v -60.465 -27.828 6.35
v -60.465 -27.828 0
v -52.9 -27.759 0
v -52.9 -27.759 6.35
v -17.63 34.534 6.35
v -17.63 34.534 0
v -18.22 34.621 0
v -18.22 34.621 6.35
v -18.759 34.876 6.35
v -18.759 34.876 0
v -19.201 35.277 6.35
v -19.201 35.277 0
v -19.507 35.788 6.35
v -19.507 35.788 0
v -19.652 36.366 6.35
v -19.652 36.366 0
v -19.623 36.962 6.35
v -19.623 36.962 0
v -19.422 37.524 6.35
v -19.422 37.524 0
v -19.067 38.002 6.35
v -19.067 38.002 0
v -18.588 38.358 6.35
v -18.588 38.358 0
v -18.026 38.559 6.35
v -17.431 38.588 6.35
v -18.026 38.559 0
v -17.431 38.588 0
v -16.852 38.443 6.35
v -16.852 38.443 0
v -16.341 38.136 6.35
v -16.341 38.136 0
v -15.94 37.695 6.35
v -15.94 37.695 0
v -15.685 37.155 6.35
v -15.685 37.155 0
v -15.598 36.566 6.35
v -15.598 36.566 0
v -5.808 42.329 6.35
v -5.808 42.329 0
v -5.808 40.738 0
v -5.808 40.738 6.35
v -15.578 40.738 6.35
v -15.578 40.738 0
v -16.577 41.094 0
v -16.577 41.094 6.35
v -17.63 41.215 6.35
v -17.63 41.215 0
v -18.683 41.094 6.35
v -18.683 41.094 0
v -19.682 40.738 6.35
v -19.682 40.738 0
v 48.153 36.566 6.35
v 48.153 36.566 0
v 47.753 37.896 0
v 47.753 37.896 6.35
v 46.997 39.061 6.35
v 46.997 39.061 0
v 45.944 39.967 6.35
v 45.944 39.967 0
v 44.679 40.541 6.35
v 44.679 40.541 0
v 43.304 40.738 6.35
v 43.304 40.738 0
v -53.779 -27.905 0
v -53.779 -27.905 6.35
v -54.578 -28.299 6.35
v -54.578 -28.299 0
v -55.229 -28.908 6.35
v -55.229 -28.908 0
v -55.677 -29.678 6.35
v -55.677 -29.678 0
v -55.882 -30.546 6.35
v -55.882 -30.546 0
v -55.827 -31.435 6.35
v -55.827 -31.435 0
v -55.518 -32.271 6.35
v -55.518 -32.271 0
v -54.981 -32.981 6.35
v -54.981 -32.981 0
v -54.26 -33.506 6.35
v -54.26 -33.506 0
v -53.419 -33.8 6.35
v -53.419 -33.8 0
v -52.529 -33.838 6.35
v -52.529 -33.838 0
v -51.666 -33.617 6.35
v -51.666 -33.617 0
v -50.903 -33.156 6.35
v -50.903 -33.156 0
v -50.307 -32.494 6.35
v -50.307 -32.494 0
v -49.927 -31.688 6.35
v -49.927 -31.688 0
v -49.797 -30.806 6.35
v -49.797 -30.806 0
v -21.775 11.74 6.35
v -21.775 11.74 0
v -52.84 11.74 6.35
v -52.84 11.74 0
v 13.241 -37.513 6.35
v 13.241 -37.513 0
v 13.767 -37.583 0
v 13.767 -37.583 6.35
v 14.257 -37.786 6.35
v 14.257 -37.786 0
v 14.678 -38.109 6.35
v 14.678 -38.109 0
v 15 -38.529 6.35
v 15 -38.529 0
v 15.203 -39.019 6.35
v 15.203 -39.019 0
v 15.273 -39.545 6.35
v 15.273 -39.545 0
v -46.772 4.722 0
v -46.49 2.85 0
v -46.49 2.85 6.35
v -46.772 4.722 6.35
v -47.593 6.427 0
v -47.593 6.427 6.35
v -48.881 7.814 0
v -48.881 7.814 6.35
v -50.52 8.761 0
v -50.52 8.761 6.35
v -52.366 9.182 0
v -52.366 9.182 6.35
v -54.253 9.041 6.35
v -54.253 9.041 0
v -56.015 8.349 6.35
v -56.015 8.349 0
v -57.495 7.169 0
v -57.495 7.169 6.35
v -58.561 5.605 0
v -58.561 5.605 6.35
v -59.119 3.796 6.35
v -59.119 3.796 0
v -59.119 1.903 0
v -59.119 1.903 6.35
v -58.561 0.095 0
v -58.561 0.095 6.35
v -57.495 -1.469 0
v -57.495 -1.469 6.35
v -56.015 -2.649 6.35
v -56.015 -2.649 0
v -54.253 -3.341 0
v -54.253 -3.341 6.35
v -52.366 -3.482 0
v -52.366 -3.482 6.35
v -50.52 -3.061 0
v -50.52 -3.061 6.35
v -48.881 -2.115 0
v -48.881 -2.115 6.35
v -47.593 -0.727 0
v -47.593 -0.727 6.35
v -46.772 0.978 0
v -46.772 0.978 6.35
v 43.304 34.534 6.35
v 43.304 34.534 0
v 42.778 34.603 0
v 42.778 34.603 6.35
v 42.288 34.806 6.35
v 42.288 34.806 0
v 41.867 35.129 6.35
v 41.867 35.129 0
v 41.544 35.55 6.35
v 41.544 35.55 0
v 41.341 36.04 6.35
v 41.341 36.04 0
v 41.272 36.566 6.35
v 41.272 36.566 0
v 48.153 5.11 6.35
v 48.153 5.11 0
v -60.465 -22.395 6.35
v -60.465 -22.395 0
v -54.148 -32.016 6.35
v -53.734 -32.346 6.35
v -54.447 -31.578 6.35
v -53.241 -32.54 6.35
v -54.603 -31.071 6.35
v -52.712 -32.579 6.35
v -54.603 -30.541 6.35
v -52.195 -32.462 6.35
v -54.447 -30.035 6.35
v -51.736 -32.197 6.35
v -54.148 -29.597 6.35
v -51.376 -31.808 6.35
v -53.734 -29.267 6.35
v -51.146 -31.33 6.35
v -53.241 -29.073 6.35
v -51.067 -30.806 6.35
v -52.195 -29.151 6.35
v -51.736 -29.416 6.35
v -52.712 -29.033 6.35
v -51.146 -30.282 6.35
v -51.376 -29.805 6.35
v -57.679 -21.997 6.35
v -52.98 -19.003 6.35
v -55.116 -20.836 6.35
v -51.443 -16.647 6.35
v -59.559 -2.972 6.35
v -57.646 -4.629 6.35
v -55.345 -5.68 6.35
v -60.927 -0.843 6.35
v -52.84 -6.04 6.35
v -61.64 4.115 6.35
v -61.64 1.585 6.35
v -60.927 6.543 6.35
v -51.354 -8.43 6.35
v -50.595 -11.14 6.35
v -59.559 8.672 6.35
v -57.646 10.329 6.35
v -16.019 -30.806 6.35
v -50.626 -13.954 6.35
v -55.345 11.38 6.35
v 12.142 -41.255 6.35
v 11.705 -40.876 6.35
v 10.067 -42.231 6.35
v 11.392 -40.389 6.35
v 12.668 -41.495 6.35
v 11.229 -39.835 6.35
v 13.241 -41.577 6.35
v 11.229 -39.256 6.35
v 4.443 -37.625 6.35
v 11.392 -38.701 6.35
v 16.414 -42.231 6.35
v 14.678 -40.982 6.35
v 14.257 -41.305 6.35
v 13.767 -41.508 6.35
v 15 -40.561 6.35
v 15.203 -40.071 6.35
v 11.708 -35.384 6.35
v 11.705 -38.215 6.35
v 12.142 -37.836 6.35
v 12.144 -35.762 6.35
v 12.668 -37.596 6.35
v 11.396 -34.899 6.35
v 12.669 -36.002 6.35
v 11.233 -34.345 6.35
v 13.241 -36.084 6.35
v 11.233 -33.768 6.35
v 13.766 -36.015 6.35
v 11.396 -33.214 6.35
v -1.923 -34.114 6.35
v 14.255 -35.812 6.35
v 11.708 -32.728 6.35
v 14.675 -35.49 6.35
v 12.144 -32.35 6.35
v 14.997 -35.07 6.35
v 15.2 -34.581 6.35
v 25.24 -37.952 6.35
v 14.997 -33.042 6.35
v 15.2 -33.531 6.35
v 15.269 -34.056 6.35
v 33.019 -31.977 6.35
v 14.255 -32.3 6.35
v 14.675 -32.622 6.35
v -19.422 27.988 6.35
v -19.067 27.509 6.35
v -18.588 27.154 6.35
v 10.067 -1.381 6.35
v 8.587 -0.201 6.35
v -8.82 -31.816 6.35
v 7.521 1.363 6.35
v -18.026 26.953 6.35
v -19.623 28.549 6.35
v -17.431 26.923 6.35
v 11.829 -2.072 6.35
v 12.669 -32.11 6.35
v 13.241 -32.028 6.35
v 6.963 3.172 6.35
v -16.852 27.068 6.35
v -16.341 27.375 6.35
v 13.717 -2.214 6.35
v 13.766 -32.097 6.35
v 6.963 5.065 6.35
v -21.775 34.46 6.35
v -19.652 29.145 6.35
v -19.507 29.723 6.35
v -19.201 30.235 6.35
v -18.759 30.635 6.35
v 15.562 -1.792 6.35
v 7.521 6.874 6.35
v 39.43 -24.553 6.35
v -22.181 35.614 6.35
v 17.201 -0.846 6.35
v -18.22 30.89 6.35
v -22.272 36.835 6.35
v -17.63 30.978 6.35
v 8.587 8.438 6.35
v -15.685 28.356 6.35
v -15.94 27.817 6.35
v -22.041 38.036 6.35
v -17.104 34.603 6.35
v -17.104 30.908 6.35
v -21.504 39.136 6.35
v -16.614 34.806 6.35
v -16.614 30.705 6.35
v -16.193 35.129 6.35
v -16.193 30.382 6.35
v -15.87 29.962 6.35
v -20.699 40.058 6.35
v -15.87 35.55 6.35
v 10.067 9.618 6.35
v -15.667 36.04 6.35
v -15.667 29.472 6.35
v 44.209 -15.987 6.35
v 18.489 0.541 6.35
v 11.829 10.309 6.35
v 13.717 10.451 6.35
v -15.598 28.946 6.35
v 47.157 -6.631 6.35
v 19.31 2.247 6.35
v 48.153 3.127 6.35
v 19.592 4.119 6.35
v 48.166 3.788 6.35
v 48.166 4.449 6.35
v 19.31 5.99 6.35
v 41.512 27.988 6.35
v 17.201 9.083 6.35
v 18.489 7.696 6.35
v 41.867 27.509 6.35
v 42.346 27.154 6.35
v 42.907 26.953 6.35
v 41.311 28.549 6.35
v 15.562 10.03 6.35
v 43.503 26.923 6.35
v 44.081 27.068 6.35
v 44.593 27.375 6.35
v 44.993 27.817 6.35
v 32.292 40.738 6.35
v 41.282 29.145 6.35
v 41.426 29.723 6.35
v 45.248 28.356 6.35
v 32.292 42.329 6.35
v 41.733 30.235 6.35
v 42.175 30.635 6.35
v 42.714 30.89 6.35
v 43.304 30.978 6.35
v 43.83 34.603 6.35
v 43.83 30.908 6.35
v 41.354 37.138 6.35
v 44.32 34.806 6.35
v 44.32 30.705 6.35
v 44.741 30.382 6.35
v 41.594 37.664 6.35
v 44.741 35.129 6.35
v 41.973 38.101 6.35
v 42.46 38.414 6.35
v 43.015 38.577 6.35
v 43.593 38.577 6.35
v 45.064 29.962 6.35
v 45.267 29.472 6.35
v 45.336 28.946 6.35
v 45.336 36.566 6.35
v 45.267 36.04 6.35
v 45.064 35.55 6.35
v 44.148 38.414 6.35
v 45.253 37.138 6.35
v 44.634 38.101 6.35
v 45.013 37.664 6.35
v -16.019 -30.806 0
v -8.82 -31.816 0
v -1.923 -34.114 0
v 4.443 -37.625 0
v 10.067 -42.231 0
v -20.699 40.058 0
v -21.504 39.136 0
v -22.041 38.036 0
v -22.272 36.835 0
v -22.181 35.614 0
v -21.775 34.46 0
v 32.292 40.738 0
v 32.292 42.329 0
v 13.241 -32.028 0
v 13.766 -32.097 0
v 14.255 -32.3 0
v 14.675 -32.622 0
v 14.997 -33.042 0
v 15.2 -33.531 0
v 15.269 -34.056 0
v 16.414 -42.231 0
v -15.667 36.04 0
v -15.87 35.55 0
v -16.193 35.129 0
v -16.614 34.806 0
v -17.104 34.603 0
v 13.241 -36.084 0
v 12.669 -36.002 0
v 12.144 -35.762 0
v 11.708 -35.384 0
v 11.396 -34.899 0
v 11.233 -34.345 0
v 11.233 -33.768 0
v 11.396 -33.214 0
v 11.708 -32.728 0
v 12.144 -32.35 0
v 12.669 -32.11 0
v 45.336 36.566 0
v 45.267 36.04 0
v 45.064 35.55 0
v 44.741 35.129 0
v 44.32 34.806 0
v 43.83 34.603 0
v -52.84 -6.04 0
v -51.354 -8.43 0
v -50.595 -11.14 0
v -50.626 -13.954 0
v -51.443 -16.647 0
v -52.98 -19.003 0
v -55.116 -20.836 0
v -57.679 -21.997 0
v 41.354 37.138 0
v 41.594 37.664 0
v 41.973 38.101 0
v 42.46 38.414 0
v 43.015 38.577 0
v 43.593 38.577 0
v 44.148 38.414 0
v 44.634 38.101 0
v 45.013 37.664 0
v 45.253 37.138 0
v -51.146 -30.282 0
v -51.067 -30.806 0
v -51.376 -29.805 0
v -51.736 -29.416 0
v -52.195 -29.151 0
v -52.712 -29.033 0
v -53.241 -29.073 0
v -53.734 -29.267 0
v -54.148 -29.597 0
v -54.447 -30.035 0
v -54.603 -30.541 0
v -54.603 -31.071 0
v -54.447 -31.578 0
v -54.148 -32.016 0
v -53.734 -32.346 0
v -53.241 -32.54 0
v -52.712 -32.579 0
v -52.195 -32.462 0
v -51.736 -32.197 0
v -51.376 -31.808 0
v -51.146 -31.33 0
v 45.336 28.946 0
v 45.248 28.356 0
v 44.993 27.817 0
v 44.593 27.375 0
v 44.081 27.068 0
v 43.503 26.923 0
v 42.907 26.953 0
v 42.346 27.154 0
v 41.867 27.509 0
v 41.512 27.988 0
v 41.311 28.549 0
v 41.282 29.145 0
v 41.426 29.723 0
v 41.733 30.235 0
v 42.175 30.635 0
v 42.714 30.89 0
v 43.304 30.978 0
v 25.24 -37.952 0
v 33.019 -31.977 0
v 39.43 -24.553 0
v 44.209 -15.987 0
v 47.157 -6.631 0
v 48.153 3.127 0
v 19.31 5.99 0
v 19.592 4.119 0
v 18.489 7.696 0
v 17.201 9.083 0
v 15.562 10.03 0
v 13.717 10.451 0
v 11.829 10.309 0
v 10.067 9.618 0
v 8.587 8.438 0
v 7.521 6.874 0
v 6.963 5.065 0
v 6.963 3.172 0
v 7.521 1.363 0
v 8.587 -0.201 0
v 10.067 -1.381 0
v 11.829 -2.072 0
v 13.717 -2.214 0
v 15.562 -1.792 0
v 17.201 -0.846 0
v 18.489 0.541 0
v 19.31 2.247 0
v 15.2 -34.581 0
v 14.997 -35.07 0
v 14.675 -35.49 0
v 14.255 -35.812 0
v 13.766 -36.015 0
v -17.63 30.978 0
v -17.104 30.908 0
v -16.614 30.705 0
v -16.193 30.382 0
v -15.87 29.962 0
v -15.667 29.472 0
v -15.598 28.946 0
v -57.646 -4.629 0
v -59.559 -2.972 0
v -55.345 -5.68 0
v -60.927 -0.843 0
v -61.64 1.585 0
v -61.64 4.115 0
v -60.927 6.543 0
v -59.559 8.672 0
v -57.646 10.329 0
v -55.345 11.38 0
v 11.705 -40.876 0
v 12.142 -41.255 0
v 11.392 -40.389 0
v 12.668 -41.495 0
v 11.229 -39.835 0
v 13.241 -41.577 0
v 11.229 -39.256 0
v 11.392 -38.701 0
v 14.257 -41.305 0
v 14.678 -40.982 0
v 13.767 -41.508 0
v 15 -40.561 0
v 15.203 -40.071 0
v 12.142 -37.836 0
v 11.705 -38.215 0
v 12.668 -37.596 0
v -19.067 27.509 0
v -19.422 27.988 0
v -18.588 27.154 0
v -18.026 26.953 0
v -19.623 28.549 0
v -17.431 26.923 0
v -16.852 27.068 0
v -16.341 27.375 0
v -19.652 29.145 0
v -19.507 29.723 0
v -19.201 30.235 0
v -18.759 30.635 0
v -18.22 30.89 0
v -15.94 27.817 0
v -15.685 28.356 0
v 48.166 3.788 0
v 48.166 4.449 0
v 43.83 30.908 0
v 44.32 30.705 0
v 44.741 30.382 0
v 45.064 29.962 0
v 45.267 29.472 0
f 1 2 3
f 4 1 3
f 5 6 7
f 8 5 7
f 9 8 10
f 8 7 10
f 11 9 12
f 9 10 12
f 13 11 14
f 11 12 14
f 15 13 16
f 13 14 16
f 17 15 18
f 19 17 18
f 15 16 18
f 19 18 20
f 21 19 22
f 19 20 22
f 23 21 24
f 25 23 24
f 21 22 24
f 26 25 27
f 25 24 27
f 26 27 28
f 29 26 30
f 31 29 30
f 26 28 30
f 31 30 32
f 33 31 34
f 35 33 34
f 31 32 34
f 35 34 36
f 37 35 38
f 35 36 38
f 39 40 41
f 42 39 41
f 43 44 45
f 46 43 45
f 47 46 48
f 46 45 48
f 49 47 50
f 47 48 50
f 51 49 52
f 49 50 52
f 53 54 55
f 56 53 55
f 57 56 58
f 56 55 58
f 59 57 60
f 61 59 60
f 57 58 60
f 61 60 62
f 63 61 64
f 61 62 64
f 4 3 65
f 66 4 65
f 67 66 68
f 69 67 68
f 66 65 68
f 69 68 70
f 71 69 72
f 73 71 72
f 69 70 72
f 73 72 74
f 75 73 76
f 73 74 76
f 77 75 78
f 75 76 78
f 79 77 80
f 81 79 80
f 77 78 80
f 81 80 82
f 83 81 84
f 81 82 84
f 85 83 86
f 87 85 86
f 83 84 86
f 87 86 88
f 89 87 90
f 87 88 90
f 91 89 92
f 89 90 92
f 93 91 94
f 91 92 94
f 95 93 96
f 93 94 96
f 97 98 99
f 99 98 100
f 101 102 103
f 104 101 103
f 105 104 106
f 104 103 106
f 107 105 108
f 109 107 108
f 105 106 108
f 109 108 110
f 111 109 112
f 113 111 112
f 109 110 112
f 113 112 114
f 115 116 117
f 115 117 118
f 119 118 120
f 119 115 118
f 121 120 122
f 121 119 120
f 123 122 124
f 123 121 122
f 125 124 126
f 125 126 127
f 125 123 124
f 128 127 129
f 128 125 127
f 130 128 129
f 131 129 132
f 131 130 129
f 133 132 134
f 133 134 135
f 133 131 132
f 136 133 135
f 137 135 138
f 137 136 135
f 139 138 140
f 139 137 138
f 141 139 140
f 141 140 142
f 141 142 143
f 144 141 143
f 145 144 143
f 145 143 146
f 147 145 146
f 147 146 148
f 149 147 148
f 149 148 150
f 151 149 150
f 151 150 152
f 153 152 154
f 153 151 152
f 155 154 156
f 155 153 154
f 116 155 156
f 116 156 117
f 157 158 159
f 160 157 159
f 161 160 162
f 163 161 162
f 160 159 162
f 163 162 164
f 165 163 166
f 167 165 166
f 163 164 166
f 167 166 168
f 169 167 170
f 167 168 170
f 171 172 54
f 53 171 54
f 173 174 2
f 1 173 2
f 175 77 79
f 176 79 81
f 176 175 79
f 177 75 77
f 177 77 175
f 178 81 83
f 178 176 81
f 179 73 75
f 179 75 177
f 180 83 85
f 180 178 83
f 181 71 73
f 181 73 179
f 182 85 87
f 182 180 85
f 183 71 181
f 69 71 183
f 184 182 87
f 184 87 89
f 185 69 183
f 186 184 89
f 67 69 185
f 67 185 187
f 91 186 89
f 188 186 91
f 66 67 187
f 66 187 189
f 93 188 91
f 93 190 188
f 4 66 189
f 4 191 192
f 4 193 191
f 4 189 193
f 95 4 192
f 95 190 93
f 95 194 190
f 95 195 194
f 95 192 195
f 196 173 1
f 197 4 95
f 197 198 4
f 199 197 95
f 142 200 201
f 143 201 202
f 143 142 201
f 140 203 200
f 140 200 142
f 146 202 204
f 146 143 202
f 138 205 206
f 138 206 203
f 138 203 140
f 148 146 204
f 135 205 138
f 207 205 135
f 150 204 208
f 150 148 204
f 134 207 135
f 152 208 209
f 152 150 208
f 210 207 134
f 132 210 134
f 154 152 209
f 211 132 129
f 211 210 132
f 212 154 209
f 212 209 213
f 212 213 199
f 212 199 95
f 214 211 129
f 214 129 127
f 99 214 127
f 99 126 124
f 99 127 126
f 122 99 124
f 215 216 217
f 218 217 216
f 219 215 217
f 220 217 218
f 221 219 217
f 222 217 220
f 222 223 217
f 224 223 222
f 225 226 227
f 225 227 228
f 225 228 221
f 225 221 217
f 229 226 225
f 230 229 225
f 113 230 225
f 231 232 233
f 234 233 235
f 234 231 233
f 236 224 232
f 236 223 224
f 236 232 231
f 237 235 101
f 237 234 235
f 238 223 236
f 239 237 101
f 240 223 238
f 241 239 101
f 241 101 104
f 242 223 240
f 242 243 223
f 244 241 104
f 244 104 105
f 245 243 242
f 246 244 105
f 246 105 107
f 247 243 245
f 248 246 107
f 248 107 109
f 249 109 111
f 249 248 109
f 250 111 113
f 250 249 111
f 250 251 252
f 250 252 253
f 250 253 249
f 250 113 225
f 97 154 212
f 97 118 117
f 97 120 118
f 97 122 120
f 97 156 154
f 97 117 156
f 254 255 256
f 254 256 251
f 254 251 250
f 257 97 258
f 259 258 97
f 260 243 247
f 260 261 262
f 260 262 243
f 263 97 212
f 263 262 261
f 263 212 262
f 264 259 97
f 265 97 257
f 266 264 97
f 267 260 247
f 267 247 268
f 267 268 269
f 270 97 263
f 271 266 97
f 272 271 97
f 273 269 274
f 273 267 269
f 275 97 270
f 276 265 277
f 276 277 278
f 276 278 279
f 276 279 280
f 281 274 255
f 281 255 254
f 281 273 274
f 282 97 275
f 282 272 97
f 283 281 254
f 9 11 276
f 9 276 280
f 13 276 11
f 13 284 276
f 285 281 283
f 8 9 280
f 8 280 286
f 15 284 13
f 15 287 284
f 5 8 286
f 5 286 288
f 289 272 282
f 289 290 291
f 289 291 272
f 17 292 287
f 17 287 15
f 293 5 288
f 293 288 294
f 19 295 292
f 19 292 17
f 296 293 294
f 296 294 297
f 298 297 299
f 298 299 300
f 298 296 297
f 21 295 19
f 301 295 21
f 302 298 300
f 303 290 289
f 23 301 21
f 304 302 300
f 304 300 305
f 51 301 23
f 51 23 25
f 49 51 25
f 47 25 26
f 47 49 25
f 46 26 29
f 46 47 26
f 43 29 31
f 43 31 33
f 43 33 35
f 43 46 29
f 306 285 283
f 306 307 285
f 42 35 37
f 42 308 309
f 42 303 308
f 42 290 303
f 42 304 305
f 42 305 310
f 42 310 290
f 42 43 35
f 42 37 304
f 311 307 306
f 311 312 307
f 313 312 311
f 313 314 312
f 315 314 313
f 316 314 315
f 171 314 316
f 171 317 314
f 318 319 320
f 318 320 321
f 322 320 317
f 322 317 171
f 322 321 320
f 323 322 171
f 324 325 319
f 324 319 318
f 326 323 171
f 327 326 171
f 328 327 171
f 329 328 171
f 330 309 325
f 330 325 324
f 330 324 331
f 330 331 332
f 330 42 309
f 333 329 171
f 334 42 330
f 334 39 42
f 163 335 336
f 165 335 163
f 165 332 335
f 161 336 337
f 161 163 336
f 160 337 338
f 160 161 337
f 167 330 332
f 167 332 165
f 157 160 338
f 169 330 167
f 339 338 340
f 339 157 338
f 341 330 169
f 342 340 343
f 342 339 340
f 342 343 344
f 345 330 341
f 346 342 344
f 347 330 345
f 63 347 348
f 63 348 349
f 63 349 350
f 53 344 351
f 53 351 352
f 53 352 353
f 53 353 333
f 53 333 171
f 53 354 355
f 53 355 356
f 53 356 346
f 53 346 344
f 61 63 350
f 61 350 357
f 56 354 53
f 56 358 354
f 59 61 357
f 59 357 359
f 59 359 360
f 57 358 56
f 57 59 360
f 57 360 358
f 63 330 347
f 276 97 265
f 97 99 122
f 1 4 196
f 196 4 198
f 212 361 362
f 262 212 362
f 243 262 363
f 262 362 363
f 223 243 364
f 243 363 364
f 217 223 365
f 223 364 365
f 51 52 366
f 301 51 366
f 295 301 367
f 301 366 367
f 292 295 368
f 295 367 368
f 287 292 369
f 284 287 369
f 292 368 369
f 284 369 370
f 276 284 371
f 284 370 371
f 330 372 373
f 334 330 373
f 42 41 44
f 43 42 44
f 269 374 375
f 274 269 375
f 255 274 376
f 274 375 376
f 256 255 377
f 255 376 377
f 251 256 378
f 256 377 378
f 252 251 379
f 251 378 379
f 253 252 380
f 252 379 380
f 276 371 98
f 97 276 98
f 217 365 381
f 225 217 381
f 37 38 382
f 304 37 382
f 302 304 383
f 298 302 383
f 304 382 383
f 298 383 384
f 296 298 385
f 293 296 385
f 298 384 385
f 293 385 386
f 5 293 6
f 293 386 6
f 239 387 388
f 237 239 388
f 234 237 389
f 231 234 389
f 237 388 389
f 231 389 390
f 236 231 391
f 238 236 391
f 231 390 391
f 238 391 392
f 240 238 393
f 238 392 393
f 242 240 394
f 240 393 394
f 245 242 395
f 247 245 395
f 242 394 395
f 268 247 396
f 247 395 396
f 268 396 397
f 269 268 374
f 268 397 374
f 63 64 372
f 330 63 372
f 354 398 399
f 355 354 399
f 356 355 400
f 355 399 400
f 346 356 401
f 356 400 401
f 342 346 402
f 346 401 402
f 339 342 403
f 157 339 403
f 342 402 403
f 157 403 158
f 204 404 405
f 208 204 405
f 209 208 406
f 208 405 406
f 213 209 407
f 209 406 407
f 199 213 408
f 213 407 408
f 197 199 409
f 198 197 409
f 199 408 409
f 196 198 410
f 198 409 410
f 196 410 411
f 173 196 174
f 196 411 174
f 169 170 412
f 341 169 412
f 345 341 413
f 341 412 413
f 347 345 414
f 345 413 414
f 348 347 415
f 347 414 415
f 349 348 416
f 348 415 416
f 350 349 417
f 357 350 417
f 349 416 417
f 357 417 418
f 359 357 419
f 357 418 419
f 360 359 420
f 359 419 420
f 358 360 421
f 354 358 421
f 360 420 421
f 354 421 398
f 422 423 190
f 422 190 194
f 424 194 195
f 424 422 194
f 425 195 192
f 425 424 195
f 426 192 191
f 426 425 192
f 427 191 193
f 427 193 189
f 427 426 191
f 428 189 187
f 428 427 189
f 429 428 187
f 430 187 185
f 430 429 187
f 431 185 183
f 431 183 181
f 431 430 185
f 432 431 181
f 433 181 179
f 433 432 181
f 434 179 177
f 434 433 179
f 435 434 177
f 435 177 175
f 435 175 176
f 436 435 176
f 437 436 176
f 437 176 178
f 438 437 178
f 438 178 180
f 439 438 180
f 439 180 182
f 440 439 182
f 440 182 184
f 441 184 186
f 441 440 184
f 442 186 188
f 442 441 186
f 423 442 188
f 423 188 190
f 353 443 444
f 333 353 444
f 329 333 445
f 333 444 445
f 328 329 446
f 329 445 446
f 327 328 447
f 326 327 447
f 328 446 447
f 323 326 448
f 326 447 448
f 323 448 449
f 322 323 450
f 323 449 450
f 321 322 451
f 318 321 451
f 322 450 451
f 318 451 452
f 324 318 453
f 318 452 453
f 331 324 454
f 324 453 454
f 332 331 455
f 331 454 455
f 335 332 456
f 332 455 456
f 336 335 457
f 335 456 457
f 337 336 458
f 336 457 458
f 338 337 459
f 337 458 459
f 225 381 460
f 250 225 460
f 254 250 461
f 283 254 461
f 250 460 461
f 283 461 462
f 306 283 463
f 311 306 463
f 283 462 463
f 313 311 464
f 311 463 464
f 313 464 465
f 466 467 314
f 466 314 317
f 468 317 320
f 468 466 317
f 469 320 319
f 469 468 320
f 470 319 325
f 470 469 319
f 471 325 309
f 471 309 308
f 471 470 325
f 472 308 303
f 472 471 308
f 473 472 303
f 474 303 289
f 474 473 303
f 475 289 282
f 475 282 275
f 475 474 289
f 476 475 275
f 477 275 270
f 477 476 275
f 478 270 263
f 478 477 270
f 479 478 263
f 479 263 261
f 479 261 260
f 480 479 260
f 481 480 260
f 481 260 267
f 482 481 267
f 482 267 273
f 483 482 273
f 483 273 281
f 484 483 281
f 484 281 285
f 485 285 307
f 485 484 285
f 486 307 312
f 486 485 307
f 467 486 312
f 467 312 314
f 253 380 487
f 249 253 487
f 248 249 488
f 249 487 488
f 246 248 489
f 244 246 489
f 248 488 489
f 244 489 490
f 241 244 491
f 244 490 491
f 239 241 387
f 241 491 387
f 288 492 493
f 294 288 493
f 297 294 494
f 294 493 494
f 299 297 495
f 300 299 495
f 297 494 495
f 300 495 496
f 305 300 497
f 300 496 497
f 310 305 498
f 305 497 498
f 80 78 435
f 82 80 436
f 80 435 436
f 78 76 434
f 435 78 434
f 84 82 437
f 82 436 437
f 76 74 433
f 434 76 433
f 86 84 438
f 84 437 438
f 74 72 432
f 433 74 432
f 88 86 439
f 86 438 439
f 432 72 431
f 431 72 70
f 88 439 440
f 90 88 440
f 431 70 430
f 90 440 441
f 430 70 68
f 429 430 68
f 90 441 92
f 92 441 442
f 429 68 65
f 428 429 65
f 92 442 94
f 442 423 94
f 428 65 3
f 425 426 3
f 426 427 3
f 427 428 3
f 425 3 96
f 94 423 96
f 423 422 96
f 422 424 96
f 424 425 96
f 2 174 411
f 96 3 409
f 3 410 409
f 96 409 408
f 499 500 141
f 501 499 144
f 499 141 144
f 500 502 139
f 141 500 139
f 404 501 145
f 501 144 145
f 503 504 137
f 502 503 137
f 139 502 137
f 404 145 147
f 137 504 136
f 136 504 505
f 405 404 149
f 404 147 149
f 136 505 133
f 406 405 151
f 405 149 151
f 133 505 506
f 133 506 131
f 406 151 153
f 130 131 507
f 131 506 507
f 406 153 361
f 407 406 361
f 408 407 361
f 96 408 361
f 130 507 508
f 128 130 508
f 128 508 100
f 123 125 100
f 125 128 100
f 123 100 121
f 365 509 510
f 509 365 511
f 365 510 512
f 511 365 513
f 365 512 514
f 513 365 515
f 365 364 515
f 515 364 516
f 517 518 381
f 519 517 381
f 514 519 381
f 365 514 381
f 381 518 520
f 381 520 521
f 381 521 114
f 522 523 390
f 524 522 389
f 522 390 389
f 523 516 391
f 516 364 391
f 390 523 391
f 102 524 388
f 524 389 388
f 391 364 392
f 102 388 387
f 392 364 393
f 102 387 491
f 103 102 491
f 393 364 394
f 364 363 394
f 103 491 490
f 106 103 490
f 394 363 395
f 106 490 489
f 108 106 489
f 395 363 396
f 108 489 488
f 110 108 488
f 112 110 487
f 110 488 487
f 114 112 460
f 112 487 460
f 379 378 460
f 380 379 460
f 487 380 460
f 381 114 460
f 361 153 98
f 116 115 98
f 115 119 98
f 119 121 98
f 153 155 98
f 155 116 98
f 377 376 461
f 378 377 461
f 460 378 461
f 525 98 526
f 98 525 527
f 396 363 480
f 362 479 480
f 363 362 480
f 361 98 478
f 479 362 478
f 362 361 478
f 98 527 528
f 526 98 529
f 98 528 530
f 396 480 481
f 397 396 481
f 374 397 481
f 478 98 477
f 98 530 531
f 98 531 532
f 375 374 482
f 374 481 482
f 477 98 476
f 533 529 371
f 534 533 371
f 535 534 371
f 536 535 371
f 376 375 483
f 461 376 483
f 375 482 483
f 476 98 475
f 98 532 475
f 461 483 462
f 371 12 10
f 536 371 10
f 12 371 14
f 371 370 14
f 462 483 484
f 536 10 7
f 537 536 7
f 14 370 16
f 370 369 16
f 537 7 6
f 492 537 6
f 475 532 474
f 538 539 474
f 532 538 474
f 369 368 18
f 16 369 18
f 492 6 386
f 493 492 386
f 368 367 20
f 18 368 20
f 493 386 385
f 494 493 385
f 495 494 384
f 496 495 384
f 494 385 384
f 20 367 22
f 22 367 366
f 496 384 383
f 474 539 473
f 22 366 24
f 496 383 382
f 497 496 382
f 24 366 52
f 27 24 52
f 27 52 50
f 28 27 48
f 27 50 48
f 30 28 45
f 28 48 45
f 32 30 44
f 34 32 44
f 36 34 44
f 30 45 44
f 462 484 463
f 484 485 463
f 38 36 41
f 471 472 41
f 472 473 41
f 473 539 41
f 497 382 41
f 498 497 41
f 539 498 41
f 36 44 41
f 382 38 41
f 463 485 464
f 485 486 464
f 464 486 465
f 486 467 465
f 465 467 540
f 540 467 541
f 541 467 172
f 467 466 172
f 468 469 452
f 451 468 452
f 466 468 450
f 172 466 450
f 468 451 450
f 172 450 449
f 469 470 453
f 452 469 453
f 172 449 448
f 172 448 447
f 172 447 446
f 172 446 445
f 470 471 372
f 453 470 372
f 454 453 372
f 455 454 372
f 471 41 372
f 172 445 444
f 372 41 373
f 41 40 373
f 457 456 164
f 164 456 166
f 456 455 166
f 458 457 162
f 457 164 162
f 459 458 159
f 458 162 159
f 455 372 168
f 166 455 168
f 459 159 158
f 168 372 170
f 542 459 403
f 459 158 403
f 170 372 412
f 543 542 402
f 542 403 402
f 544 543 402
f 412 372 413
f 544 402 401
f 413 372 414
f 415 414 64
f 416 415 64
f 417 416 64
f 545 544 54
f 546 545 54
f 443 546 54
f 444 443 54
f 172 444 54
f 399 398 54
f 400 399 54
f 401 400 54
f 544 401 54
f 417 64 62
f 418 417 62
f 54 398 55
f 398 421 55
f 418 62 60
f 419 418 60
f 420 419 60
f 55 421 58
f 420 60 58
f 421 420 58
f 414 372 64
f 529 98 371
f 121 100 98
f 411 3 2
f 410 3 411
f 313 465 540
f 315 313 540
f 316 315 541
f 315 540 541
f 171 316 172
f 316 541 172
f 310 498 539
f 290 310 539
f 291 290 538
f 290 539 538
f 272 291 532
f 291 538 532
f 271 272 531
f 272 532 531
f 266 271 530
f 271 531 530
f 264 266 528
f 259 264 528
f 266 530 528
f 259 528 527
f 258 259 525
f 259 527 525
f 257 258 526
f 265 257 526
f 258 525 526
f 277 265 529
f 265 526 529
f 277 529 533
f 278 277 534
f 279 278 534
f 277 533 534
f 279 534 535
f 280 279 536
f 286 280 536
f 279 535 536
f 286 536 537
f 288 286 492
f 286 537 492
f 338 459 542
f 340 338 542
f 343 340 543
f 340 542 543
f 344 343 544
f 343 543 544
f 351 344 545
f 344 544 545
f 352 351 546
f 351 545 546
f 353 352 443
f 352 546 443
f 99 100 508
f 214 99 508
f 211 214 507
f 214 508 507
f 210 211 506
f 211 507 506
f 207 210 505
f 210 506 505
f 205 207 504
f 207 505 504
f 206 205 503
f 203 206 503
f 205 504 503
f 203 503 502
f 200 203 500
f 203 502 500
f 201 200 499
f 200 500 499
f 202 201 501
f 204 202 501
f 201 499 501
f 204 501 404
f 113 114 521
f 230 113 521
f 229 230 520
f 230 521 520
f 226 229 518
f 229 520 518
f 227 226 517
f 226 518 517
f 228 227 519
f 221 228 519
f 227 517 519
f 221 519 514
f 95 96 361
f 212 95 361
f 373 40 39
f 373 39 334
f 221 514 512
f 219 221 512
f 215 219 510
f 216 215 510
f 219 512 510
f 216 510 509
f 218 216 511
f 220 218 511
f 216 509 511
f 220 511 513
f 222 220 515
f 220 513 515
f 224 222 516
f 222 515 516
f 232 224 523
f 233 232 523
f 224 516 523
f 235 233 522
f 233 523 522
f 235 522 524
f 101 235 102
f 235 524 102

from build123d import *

# Parameters (mm, degrees)
F0_R     = 1.778
F0_R_2   = 6.35
F0_W     = 38.1
F0_H     = 1.5911871894
F1_DEPTH = 6.35


with BuildPart() as f1:
    # F0 (on Top) → F1 (new body)
    with BuildSketch(Plane.XY):
        with BuildLine():
            Line((16.4140281489, -30.8064179522), (16.4140281489, -30.6620997704))
            ThreePointArc((16.4140281489, -30.6620997704), (38.6980048273, -19.7929887048), (48.1532220223, 3.1266984605))
            Line((48.1532220223, 3.1266984605), (48.1532220223, 5.1104656351))
            ThreePointArc((48.1532220223, 5.1104656351), (44.4486160884, 19.800484772), (34.8719360944, 31.5396486119))
            Line((34.8719360944, 31.5396486119), (32.2923098035, 36.5656356997))
            Line((32.2923098035, 36.5656356997), (32.2923098035, 40.7379940159))
            Line((32.2923098035, 40.7379940159), (-5.8076901965, 40.7379940159))
            Line((-5.8076901965, 40.7379940159), (-5.8076901965, 36.5656356997))
            Line((-5.8076901965, 36.5656356997), (-8.3873164875, 31.5396486119))
            ThreePointArc((-8.3873164875, 31.5396486119), (-18.0627806357, 19.7145570203), (-21.7750586109, 4.893410308))
            ThreePointArc((-21.7750586109, 4.893410308), (-21.4769400323, -0.6314389882), (-20.311434257, -6.0401755062))
            ThreePointArc((-20.311434257, -6.0401755062), (-16.1913746397, -14.967065801), (-9.7499520252, -22.3948741107))
            Line((-9.7499520252, -22.3948741107), (-52.8449263588, -22.3948741107))
            Line((-52.8449263588, -22.3948741107), (-60.4649263588, -22.3948741107))
            Line((-60.4649263588, -22.3948741107), (-60.4649263588, -27.8276202867))
            Line((-60.4649263588, -27.8276202867), (-52.9002836607, -27.758920689))
            ThreePointArc((-52.9002836607, -27.758920689), (-54.980526385, -32.9811631161), (-49.7969263588, -30.8064179522))
            Line((-49.7969263588, -30.8064179522), (-19.8648082777, -30.8064179522))
            ThreePointArc((-19.8648082777, -30.8064179522), (-17.9420934961, -30.7601008655), (-16.0193787145, -30.8064179522))
            Line((-16.0193787145, -30.8064179522), (10.0673098035, -30.8064179522))
            Line((10.0673098035, -30.8064179522), (13.2406689762, -30.8064179522))
            Line((13.2406689762, -30.8064179522), (16.4140281489, -30.8064179522))
        make_face()
        with Locations((-52.8449263588, -30.8064179522)):
            Circle(F0_R, mode=Mode.SUBTRACT)
        with Locations((13.2423098035, 4.1185820478)):
            Circle(F0_R_2, mode=Mode.SUBTRACT)
        with BuildLine():
            ThreePointArc((48.1532220223, 3.1266984605), (38.6980048273, -19.7929887048), (16.4140281489, -30.6620997704))
            Line((16.4140281489, -30.6620997704), (16.4140281489, -30.8064179522))
            Line((16.4140281489, -30.8064179522), (16.4140281489, -42.2313285658))
            ThreePointArc((16.4140281489, -42.2313285658), (39.4304466926, -24.5532899944), (48.1532220223, 3.1266984605))
        make_face()
        with BuildLine():
            Line((48.1532220223, 5.1104656351), (48.1532220223, 3.1266984605))
            ThreePointArc((48.1532220223, 3.1266984605), (48.1673098035, 4.1185820478), (48.1532220223, 5.1104656351))
        make_face()
        with BuildLine():
            Line((16.4140281489, -42.2313285658), (16.4140281489, -30.8064179522))
            Line((16.4140281489, -30.8064179522), (13.2406689762, -30.8064179522))
            Line((13.2406689762, -30.8064179522), (13.2406689762, -32.0282139509))
            ThreePointArc((13.2406689762, -32.0282139509), (14.6746436477, -32.6221857079), (15.2686154047, -34.0561603794))
            ThreePointArc((15.2686154047, -34.0561603794), (14.6746436477, -35.4901350508), (13.2406689762, -36.0841068079))
            Line((13.2406689762, -36.0841068079), (13.2406689762, -37.5133532824))
            ThreePointArc((13.2406689762, -37.5133532824), (14.6775099555, -38.108512303), (15.2726689762, -39.5453532824))
            ThreePointArc((15.2726689762, -39.5453532824), (14.6775099555, -40.9821942618), (13.2406689762, -41.5773532824))
            Line((13.2406689762, -41.5773532824), (13.2406689762, -42.2313285658))
            Line((13.2406689762, -42.2313285658), (16.4140281489, -42.2313285658))
        make_face()
        with BuildLine():
            ThreePointArc((34.8719360944, 31.5396486119), (44.4486160884, 19.800484772), (48.1532220223, 5.1104656351))
            Line((48.1532220223, 5.1104656351), (48.1532220223, 36.5656356997))
            ThreePointArc((48.1532220223, 36.5656356997), (46.5024271992, 39.5513463721), (43.3037619874, 40.7379940159))
            Line((43.3037619874, 40.7379940159), (32.2923098035, 40.7379940159))
            Line((32.2923098035, 40.7379940159), (32.2923098035, 36.5656356997))
            Line((32.2923098035, 36.5656356997), (34.8719360944, 31.5396486119))
        make_face()
        with BuildLine():
            ThreePointArc((45.3357619874, 28.9456356997), (41.866921008, 27.5087947203), (43.3037619874, 30.9776356997))
            ThreePointArc((43.3037619874, 30.9776356997), (44.7406029667, 30.3824766791), (45.3357619874, 28.9456356997))
        make_face(mode=Mode.SUBTRACT)
        with BuildLine():
            ThreePointArc((43.3037619874, 34.5336356997), (41.866921008, 35.1287947203), (41.2717619874, 36.5656356997))
            ThreePointArc((41.2717619874, 36.5656356997), (43.3037619874, 38.5976356997), (45.3357619874, 36.5656356997))
            ThreePointArc((45.3357619874, 36.5656356997), (44.7406029667, 35.1287947203), (43.3037619874, 34.5336356997))
        make_face(mode=Mode.SUBTRACT)
        with BuildLine():
            Line((13.2406689762, -32.0282139509), (13.2406689762, -30.8064179522))
            Line((13.2406689762, -30.8064179522), (10.0673098035, -30.8064179522))
            Line((10.0673098035, -30.8064179522), (10.0673098035, -42.2313285658))
            Line((10.0673098035, -42.2313285658), (13.2406689762, -42.2313285658))
            Line((13.2406689762, -42.2313285658), (13.2406689762, -41.5773532824))
            ThreePointArc((13.2406689762, -41.5773532824), (11.2086689762, -39.5453532824), (13.2406689762, -37.5133532824))
            Line((13.2406689762, -37.5133532824), (13.2406689762, -36.0841068079))
            ThreePointArc((13.2406689762, -36.0841068079), (11.2127225477, -34.0561603794), (13.2406689762, -32.0282139509))
        make_face()
        with BuildLine():
            Line((10.0673098035, -42.2313285658), (10.0673098035, -30.8064179522))
            Line((10.0673098035, -30.8064179522), (-16.0193787145, -30.8064179522))
            ThreePointArc((-16.0193787145, -30.8064179522), (-1.9228841261, -34.1141975872), (10.0673098035, -42.2313285658))
        make_face()
        with BuildLine():
            Line((-19.8648082777, -30.8064179522), (-16.0193787145, -30.8064179522))
            ThreePointArc((-16.0193787145, -30.8064179522), (-17.9420934961, -30.7601008655), (-19.8648082777, -30.8064179522))
        make_face()
        with Locations((13.2423098035, 41.5335876106)):
            Rectangle(F0_W, F0_H)
        with BuildLine():
            Line((-5.8076901965, 36.5656356997), (-5.8076901965, 40.7379940159))
            Line((-5.8076901965, 40.7379940159), (-15.5782827911, 40.7379940159))
            Line((-15.5782827911, 40.7379940159), (-19.681555644, 40.7379940159))
            ThreePointArc((-19.681555644, 40.7379940159), (-22.040670707, 38.0363692731), (-21.7750586109, 34.4595480103))
            Line((-21.7750586109, 34.4595480103), (-21.7750586109, 11.7398244938))
            Line((-21.7750586109, 11.7398244938), (-21.7750586109, 4.893410308))
            ThreePointArc((-21.7750586109, 4.893410308), (-18.0627806357, 19.7145570203), (-8.3873164875, 31.5396486119))
            Line((-8.3873164875, 31.5396486119), (-5.8076901965, 36.5656356997))
        make_face()
        with BuildLine():
            ThreePointArc((-15.5979192176, 28.9456356997), (-19.0667601969, 27.5087947203), (-17.6299192176, 30.9776356997))
            ThreePointArc((-17.6299192176, 30.9776356997), (-16.1930782382, 30.3824766791), (-15.5979192176, 28.9456356997))
        make_face(mode=Mode.SUBTRACT)
        with BuildLine():
            ThreePointArc((-17.6299192176, 34.5336356997), (-19.0667601969, 38.0024766791), (-15.5979192176, 36.5656356997))
            ThreePointArc((-15.5979192176, 36.5656356997), (-16.1930782382, 35.1287947203), (-17.6299192176, 34.5336356997))
        make_face(mode=Mode.SUBTRACT)
        with BuildLine():
            Line((-19.681555644, 40.7379940159), (-15.5782827911, 40.7379940159))
            ThreePointArc((-15.5782827911, 40.7379940159), (-17.6299192176, 41.2151287844), (-19.681555644, 40.7379940159))
        make_face()
        with BuildLine():
            ThreePointArc((-20.311434257, -6.0401755062), (-21.4769400323, -0.6314389882), (-21.7750586109, 4.893410308))
            Line((-21.7750586109, 4.893410308), (-21.7750586109, 11.7398244938))
            Line((-21.7750586109, 11.7398244938), (-52.8400652111, 11.7398244938))
            ThreePointArc((-52.8400652111, 11.7398244938), (-61.7300652111, 2.8498244938), (-52.8400652111, -6.0401755062))
            Line((-52.8400652111, -6.0401755062), (-20.311434257, -6.0401755062))
        make_face()
        with Locations((-52.8400652111, 2.8498244938)):
            Circle(F0_R_2, mode=Mode.SUBTRACT)
        with BuildLine():
            ThreePointArc((-52.8400652111, -6.0401755062), (-51.4425282025, -16.6465074734), (-60.4649263588, -22.3948741107))
            Line((-60.4649263588, -22.3948741107), (-52.8449263588, -22.3948741107))
            Line((-52.8449263588, -22.3948741107), (-9.7499520252, -22.3948741107))
            ThreePointArc((-9.7499520252, -22.3948741107), (-16.1913746397, -14.967065801), (-20.311434257, -6.0401755062))
            Line((-20.311434257, -6.0401755062), (-52.8400652111, -6.0401755062))
        make_face()
    extrude(amount=F1_DEPTH)


solid = f1.part
